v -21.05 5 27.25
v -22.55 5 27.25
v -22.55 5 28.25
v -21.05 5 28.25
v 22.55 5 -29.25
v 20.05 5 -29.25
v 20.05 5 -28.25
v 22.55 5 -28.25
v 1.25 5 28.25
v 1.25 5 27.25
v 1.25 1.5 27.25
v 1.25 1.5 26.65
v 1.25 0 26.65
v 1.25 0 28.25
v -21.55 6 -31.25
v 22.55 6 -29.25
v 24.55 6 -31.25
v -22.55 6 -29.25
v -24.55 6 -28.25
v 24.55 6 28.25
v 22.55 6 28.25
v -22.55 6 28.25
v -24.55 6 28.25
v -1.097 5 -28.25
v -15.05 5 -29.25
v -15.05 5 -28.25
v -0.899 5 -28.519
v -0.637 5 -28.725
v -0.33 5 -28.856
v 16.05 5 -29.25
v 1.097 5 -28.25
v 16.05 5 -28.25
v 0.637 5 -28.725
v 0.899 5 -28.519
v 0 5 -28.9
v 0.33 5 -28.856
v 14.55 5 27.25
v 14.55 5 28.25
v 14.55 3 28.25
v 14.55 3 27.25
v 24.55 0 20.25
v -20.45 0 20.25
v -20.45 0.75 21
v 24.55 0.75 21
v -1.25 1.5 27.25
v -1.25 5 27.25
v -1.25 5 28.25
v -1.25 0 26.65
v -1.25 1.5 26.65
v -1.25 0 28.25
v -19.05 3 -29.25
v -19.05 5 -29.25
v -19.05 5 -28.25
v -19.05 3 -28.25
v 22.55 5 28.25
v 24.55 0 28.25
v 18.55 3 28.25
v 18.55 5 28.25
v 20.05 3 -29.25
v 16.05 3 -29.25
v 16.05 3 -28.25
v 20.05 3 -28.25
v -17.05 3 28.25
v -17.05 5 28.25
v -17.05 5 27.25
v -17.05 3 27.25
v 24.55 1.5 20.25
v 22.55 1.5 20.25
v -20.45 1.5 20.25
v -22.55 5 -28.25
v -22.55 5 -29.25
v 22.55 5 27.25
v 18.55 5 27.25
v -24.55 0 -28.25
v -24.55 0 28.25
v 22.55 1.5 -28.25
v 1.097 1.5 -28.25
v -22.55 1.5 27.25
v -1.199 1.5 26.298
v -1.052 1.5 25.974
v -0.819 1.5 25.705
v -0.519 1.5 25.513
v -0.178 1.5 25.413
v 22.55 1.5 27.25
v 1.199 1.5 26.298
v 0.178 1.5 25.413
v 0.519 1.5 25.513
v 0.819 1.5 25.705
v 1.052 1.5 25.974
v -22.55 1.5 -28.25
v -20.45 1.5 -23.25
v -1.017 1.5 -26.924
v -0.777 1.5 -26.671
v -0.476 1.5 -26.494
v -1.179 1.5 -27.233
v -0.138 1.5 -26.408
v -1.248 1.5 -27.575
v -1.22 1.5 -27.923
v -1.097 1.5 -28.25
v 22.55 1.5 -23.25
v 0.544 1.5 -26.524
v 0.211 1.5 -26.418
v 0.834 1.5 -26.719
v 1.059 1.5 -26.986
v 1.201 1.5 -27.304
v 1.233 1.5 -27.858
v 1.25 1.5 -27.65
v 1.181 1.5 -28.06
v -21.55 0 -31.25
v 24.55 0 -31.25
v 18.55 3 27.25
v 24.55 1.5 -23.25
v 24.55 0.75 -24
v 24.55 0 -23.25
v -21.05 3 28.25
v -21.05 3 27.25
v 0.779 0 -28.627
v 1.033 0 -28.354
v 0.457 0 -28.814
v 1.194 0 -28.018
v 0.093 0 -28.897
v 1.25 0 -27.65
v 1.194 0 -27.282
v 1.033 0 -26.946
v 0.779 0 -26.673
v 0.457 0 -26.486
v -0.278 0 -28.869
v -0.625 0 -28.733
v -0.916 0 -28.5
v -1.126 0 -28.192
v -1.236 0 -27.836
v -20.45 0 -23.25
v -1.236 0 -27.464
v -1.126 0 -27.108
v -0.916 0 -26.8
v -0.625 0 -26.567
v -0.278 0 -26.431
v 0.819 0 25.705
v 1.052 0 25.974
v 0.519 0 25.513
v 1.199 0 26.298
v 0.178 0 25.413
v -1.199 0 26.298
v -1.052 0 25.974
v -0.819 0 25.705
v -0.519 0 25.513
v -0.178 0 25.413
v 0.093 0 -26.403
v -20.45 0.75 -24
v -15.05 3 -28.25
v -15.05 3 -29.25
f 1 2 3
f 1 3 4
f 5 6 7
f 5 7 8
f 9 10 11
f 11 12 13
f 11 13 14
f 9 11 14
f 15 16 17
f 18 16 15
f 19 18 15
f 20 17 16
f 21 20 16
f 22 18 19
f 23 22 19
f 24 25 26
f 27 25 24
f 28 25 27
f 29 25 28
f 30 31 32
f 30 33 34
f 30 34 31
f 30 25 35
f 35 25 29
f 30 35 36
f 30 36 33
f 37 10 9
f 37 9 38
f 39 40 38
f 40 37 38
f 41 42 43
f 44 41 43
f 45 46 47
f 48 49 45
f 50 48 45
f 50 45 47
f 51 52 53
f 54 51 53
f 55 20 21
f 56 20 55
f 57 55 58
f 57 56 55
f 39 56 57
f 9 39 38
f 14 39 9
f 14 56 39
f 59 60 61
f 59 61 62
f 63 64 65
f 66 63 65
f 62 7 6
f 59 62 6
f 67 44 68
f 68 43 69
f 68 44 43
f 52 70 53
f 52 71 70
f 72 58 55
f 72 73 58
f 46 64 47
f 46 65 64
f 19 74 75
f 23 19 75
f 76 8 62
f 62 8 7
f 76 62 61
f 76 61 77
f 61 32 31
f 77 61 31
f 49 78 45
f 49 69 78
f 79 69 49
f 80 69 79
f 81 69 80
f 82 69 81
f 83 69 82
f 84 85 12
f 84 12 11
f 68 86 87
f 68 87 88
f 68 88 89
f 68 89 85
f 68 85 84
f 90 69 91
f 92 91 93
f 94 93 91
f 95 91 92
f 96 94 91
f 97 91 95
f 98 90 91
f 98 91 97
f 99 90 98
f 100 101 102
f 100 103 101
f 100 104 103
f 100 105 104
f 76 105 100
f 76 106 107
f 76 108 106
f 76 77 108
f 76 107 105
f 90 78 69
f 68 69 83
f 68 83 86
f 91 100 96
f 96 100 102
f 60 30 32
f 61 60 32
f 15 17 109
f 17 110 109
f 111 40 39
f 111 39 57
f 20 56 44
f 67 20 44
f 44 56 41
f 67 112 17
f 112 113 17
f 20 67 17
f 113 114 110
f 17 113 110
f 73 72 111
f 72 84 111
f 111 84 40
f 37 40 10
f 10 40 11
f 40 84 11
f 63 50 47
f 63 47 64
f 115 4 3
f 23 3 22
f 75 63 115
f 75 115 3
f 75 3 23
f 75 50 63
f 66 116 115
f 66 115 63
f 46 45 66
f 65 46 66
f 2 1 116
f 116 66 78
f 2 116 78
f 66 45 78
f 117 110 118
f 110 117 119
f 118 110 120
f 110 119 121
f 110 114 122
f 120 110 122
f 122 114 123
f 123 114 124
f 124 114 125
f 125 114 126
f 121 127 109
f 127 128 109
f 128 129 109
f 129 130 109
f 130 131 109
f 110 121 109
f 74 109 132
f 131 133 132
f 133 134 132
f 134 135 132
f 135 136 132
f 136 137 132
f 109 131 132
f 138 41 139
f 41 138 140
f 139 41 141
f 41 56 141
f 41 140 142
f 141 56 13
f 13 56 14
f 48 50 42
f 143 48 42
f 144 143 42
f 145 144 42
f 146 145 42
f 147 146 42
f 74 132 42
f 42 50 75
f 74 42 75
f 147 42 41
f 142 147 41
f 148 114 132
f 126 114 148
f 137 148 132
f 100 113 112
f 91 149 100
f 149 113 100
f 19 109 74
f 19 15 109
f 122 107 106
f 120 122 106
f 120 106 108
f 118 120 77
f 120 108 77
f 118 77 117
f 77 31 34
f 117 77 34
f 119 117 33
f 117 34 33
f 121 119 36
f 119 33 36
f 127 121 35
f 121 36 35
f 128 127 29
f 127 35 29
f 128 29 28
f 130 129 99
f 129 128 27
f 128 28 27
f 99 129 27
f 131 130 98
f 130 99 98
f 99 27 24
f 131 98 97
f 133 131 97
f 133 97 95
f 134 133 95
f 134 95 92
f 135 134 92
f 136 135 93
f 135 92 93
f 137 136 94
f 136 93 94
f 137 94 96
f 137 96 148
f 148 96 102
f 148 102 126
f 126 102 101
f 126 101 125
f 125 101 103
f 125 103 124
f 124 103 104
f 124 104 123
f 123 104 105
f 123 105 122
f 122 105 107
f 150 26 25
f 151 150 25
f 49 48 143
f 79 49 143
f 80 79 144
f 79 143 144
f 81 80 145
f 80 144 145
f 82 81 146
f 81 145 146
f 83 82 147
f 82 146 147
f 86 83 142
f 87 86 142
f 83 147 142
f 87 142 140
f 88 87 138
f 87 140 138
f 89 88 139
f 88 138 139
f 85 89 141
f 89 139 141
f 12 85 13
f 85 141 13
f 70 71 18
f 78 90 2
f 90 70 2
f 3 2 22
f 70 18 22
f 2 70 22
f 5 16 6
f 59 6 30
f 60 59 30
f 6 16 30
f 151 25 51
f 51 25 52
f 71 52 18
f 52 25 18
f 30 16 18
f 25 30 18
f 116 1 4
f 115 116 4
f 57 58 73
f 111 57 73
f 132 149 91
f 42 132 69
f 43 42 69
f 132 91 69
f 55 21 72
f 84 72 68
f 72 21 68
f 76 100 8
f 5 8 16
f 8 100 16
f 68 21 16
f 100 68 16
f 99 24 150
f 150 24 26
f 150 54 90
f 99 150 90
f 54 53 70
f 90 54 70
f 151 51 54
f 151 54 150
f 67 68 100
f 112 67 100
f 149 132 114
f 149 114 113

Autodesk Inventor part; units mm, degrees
ref_plane "YZ Plane" through (0, 0, 0) normal (1, 0, 0) x (0, 1, 0)
ref_plane "XZ Plane" through (0, 0, 0) normal (0, 1, 0) x (-1, 0, 0)
ref_plane "XY Plane" through (0, 0, 0) normal (0, 0, 1) x (1, 0, 0)
sketch "Sketch1" plane through (0, 0, 0) normal (0, 1, 0) x (-1, 0, 0)
  line L0 (-24.55, -31.25) -> (24.55, -31.25)
  line L1 (24.55, -31.25) -> (24.55, 31.25)
  line L2 (24.55, 31.25) -> (-24.55, 31.25)
  line L3 (-24.55, 31.25) -> (-24.55, -31.25)
  line L4 (-24.55, -31.25) -> (24.55, 31.25) construction
  line L5 (24.55, -31.25) -> (-24.55, 31.25) construction
  point P0 (0, 0)
  dimension "d0" = 62.5
  dimension "d1" = 49.1
extrude "Extrusion1" add sketch "Sketch1" along normal blind 6
sketch "Sketch2" plane through (0, 6, 0) normal (0, 1, 0) x (1, 0, 0)
  line L0 (22.55, 29.25) -> (-22.55, 29.25)
  line L1 (-22.55, 29.25) -> (-22.55, -29.25)
  line L2 (-22.55, -29.25) -> (22.55, -29.25)
  line L3 (22.55, -29.25) -> (22.55, 29.25)
  line L4 (22.55, 29.25) -> (-22.55, -29.25) construction
  line L5 (-22.55, 29.25) -> (22.55, -29.25) construction
  line L6 (-24.55, 31.25) -> (-24.55, -31.25) projected
  line L7 (-24.55, -31.25) -> (24.55, -31.25) projected
  point P0 (0, 0)
  dimension "d4" = 2
  dimension "d5" = 2
extrude "Extrusion2" cut sketch "Sketch2" against normal blind 1
sketch "Sketch3" plane through (0, 5, 0) normal (0, 1, 0) x (1, 0, 0)
  line L0 (22.55, 28.25) -> (-22.55, 28.25)
  line L1 (-22.55, 28.25) -> (-22.55, -28.25)
  line L2 (-22.55, -28.25) -> (22.55, -28.25)
  line L3 (22.55, -28.25) -> (22.55, 28.25)
  line L4 (22.55, 28.25) -> (-22.55, -28.25) construction
  line L5 (-22.55, 28.25) -> (22.55, -28.25) construction
  line L6 (-22.55, 29.25) -> (22.55, 29.25) projected
  line L7 (-22.55, -29.25) -> (-22.55, 29.25) projected
  point P0 (0, 0)
  dimension "d48" = 1
extrude "Extrusion3" cut sketch "Sketch3" against normal blind 3.5
sketch "Sketch9" plane through (0, 6, 0) normal (0, 1, 0) x (1, 0, 0)
  line L0 (24.55, -28.25) -> (-24.55, -28.25)
  line L1 (-24.55, -28.25) -> (-24.55, -31.25)
  line L2 (-24.55, -31.25) -> (24.55, -31.25)
  line L3 (24.55, -31.25) -> (24.55, -28.25)
  line L4 (24.55, -31.25) -> (24.55, 31.25) projected
  line L5 (-22.55, 29.25) -> (22.55, 29.25) projected
  point P0 (0, 0)
  point P1 (-21.55, 29.25)
  point P2 (21.55, 29.25)
  dimension "d36" = 57.5
extrude "Extrusion7" cut sketch "Sketch9" against normal through all
sketch "Sketch10" plane through (0, 1.5, 0) normal (0, 1, 0) x (1, 0, 0)
  line L0 (22.55, -28.25) -> (-22.55, -28.25) projected
  line L1 (-22.55, -28.25) -> (22.55, -28.25)
  line L2 (22.55, -28.25) -> (22.55, -27.25)
  line L3 (22.55, -27.25) -> (-22.55, -27.25)
  line L4 (-22.55, -27.25) -> (-22.55, -28.25)
  point P0 (0, 0)
  point P1 (22.55, -28.25)
  dimension "d39" = 1
extrude "Extrusion8" add sketch "Sketch10" along normal up to surface (3.5 mm away)
sketch "Sketch11" plane through (0, 1.5, 0) normal (0, 1, 0) x (1, 0, 0)
  circle A0 centre (0, 27.65) radius 1.25
  circle A1 centre (0, -26.65) radius 1.25
  line L0 (1.25, -26.65) -> (1.25, -28.25)
  line L1 (-22.55, -28.25) -> (22.55, -28.25) projected
  line L2 (-1.25, -26.65) -> (-1.25, -28.25)
  point P0 (0, 0)
  dimension "d42" = 2.5
  dimension "d43" = 2.5
  dimension "d44" = 54.3
  dimension "d45" = 27.65
extrude "Extrusion9" cut sketch "Sketch11" along normal through all both and the other way through all
sketch "Sketch12" plane through (0, 6, 0) normal (0, 1, 0) x (1, 0, 0)
  line L0 (24.55, 31.25) -> (-24.55, 31.25) projected
  line L1 (-21.55, 31.25) -> (-24.55, 28.25)
  line L2 (-24.55, 31.25) -> (-24.55, -28.25) projected
  point P0 (0, 0)
  dimension "d49" = 3
  dimension "d50" = 3
extrude "Extrusion10" cut sketch "Sketch12" against normal blind 10
sketch "Sketch13" plane through (-22.55, 5, 28.25) normal (0, 1, 0) x (1, 0, 0)
  line L0 (21.3, 0) -> (-2, 0) projected
  line L1 (0, 1) -> (21.3, 1) projected
  line L2 (1.5, 0) -> (5.5, 0)
  line L3 (5.5, 0) -> (5.5, 1)
  line L4 (5.5, 1) -> (1.5, 1)
  line L5 (1.5, 1) -> (1.5, 0)
  line L6 (37.1, 0) -> (41.1, 0)
  line L7 (41.1, 0) -> (41.1, 1)
  line L8 (41.1, 1) -> (37.1, 1)
  line L9 (37.1, 1) -> (37.1, 0)
  line L10 (0, 0) -> (0, 57.5) projected
  line L11 (45.1, 57.5) -> (45.1, 0) projected
  line L12 (0, 56.5) -> (21.4534, 56.5) projected
  line L13 (0, 57.5) -> (45.1, 57.5) projected
  line L14 (3.5, 56.5) -> (7.5, 56.5)
  line L15 (7.5, 56.5) -> (7.5, 57.5)
  line L16 (7.5, 57.5) -> (3.5, 57.5)
  line L17 (3.5, 57.5) -> (3.5, 56.5)
  line L18 (38.6, 56.5) -> (42.6, 56.5)
  line L19 (42.6, 56.5) -> (42.6, 57.5)
  line L20 (42.6, 57.5) -> (38.6, 57.5)
  line L21 (38.6, 57.5) -> (38.6, 56.5)
  point P0 (22.55, 28.25)
  point P1 (38.6, 57)
  point P2 (3.5, 57.5)
  point P3 (7.5, 56.5)
  point P4 (38.6, 57.5)
  point P5 (1.5, 1)
  point P6 (5.5, 0)
  dimension "d53" = 4
  dimension "d54" = 4
  dimension "d55" = 1.5
  dimension "d56" = 4
  dimension "d57" = 3.5
  dimension "d58" = 2.5
  dimension "d59" = 4
  dimension "d60" = 4
extrude "Extrusion11" cut sketch "Sketch13" against normal blind 2 contours L13 L19 L18 L21 | L0 L5 L1 L3 | L17 L13 L15 L12 | L9 L8 L7 L6
sketch "Sketch17" plane through (-24.55, 0, 28.25) normal (-1, 0, 0) x (0, 0, 1)
  line L0 (-56.5, 0) -> (0, 0) projected
  line L1 (-1, 1.5) -> (-56.5, 1.5) projected
  line L2 (-8, 0) -> (-51.5, 0)
  line L3 (-51.5, 0) -> (-51.5, 1.5)
  line L4 (-51.5, 1.5) -> (-8, 1.5)
  line L5 (-8, 1.5) -> (-8, 0)
  line L6 (0, 0) -> (0, 6) projected
  line L7 (-8, 1.5) -> (-6, 1.5)
  line L8 (-8, 0.5) -> (-8, 1.5)
  line L9 (-8, 0) -> (-7.25, 0.75)
  line L10 (-8, 0) -> (-6.9393, 0) construction
  line L11 (-7.25, 0.75) -> (-8, 1.5)
  line L12 (-51.5, 0) -> (-52.25, 0.75)
  line L13 (-51.5, 0) -> (-50.4393, 0) construction
  line L14 (-52.25, 0.75) -> (-51.5, 1.5)
  line L15 (-59.5, 0) -> (-59.5, 6) projected
  line L16 (-8, 0) -> (-51.5, 0)
  line L17 (-51.5, 1.5) -> (-8, 1.5)
  point P0 (-28.25, 0)
  dimension "d69" = 8
  dimension "d72" = 45
  dimension "d73" = 45
  dimension "d75" = 45
  dimension "d76" = 45
  dimension "d77" = 8
extrude "Extrusion13" cut sketch "Sketch17" against normal through all
extrude "Extrusion14" add sketch "Sketch17" against normal blind 4.1
equation "\"d5\" = d4"
equation "\"d43\" = d42"
equation "\"d50\" = d49"
equation "\"d73\" = d72"
equation "\"d76\" = d75"
properties part number "Module Cover" material "ABS Plastic"
